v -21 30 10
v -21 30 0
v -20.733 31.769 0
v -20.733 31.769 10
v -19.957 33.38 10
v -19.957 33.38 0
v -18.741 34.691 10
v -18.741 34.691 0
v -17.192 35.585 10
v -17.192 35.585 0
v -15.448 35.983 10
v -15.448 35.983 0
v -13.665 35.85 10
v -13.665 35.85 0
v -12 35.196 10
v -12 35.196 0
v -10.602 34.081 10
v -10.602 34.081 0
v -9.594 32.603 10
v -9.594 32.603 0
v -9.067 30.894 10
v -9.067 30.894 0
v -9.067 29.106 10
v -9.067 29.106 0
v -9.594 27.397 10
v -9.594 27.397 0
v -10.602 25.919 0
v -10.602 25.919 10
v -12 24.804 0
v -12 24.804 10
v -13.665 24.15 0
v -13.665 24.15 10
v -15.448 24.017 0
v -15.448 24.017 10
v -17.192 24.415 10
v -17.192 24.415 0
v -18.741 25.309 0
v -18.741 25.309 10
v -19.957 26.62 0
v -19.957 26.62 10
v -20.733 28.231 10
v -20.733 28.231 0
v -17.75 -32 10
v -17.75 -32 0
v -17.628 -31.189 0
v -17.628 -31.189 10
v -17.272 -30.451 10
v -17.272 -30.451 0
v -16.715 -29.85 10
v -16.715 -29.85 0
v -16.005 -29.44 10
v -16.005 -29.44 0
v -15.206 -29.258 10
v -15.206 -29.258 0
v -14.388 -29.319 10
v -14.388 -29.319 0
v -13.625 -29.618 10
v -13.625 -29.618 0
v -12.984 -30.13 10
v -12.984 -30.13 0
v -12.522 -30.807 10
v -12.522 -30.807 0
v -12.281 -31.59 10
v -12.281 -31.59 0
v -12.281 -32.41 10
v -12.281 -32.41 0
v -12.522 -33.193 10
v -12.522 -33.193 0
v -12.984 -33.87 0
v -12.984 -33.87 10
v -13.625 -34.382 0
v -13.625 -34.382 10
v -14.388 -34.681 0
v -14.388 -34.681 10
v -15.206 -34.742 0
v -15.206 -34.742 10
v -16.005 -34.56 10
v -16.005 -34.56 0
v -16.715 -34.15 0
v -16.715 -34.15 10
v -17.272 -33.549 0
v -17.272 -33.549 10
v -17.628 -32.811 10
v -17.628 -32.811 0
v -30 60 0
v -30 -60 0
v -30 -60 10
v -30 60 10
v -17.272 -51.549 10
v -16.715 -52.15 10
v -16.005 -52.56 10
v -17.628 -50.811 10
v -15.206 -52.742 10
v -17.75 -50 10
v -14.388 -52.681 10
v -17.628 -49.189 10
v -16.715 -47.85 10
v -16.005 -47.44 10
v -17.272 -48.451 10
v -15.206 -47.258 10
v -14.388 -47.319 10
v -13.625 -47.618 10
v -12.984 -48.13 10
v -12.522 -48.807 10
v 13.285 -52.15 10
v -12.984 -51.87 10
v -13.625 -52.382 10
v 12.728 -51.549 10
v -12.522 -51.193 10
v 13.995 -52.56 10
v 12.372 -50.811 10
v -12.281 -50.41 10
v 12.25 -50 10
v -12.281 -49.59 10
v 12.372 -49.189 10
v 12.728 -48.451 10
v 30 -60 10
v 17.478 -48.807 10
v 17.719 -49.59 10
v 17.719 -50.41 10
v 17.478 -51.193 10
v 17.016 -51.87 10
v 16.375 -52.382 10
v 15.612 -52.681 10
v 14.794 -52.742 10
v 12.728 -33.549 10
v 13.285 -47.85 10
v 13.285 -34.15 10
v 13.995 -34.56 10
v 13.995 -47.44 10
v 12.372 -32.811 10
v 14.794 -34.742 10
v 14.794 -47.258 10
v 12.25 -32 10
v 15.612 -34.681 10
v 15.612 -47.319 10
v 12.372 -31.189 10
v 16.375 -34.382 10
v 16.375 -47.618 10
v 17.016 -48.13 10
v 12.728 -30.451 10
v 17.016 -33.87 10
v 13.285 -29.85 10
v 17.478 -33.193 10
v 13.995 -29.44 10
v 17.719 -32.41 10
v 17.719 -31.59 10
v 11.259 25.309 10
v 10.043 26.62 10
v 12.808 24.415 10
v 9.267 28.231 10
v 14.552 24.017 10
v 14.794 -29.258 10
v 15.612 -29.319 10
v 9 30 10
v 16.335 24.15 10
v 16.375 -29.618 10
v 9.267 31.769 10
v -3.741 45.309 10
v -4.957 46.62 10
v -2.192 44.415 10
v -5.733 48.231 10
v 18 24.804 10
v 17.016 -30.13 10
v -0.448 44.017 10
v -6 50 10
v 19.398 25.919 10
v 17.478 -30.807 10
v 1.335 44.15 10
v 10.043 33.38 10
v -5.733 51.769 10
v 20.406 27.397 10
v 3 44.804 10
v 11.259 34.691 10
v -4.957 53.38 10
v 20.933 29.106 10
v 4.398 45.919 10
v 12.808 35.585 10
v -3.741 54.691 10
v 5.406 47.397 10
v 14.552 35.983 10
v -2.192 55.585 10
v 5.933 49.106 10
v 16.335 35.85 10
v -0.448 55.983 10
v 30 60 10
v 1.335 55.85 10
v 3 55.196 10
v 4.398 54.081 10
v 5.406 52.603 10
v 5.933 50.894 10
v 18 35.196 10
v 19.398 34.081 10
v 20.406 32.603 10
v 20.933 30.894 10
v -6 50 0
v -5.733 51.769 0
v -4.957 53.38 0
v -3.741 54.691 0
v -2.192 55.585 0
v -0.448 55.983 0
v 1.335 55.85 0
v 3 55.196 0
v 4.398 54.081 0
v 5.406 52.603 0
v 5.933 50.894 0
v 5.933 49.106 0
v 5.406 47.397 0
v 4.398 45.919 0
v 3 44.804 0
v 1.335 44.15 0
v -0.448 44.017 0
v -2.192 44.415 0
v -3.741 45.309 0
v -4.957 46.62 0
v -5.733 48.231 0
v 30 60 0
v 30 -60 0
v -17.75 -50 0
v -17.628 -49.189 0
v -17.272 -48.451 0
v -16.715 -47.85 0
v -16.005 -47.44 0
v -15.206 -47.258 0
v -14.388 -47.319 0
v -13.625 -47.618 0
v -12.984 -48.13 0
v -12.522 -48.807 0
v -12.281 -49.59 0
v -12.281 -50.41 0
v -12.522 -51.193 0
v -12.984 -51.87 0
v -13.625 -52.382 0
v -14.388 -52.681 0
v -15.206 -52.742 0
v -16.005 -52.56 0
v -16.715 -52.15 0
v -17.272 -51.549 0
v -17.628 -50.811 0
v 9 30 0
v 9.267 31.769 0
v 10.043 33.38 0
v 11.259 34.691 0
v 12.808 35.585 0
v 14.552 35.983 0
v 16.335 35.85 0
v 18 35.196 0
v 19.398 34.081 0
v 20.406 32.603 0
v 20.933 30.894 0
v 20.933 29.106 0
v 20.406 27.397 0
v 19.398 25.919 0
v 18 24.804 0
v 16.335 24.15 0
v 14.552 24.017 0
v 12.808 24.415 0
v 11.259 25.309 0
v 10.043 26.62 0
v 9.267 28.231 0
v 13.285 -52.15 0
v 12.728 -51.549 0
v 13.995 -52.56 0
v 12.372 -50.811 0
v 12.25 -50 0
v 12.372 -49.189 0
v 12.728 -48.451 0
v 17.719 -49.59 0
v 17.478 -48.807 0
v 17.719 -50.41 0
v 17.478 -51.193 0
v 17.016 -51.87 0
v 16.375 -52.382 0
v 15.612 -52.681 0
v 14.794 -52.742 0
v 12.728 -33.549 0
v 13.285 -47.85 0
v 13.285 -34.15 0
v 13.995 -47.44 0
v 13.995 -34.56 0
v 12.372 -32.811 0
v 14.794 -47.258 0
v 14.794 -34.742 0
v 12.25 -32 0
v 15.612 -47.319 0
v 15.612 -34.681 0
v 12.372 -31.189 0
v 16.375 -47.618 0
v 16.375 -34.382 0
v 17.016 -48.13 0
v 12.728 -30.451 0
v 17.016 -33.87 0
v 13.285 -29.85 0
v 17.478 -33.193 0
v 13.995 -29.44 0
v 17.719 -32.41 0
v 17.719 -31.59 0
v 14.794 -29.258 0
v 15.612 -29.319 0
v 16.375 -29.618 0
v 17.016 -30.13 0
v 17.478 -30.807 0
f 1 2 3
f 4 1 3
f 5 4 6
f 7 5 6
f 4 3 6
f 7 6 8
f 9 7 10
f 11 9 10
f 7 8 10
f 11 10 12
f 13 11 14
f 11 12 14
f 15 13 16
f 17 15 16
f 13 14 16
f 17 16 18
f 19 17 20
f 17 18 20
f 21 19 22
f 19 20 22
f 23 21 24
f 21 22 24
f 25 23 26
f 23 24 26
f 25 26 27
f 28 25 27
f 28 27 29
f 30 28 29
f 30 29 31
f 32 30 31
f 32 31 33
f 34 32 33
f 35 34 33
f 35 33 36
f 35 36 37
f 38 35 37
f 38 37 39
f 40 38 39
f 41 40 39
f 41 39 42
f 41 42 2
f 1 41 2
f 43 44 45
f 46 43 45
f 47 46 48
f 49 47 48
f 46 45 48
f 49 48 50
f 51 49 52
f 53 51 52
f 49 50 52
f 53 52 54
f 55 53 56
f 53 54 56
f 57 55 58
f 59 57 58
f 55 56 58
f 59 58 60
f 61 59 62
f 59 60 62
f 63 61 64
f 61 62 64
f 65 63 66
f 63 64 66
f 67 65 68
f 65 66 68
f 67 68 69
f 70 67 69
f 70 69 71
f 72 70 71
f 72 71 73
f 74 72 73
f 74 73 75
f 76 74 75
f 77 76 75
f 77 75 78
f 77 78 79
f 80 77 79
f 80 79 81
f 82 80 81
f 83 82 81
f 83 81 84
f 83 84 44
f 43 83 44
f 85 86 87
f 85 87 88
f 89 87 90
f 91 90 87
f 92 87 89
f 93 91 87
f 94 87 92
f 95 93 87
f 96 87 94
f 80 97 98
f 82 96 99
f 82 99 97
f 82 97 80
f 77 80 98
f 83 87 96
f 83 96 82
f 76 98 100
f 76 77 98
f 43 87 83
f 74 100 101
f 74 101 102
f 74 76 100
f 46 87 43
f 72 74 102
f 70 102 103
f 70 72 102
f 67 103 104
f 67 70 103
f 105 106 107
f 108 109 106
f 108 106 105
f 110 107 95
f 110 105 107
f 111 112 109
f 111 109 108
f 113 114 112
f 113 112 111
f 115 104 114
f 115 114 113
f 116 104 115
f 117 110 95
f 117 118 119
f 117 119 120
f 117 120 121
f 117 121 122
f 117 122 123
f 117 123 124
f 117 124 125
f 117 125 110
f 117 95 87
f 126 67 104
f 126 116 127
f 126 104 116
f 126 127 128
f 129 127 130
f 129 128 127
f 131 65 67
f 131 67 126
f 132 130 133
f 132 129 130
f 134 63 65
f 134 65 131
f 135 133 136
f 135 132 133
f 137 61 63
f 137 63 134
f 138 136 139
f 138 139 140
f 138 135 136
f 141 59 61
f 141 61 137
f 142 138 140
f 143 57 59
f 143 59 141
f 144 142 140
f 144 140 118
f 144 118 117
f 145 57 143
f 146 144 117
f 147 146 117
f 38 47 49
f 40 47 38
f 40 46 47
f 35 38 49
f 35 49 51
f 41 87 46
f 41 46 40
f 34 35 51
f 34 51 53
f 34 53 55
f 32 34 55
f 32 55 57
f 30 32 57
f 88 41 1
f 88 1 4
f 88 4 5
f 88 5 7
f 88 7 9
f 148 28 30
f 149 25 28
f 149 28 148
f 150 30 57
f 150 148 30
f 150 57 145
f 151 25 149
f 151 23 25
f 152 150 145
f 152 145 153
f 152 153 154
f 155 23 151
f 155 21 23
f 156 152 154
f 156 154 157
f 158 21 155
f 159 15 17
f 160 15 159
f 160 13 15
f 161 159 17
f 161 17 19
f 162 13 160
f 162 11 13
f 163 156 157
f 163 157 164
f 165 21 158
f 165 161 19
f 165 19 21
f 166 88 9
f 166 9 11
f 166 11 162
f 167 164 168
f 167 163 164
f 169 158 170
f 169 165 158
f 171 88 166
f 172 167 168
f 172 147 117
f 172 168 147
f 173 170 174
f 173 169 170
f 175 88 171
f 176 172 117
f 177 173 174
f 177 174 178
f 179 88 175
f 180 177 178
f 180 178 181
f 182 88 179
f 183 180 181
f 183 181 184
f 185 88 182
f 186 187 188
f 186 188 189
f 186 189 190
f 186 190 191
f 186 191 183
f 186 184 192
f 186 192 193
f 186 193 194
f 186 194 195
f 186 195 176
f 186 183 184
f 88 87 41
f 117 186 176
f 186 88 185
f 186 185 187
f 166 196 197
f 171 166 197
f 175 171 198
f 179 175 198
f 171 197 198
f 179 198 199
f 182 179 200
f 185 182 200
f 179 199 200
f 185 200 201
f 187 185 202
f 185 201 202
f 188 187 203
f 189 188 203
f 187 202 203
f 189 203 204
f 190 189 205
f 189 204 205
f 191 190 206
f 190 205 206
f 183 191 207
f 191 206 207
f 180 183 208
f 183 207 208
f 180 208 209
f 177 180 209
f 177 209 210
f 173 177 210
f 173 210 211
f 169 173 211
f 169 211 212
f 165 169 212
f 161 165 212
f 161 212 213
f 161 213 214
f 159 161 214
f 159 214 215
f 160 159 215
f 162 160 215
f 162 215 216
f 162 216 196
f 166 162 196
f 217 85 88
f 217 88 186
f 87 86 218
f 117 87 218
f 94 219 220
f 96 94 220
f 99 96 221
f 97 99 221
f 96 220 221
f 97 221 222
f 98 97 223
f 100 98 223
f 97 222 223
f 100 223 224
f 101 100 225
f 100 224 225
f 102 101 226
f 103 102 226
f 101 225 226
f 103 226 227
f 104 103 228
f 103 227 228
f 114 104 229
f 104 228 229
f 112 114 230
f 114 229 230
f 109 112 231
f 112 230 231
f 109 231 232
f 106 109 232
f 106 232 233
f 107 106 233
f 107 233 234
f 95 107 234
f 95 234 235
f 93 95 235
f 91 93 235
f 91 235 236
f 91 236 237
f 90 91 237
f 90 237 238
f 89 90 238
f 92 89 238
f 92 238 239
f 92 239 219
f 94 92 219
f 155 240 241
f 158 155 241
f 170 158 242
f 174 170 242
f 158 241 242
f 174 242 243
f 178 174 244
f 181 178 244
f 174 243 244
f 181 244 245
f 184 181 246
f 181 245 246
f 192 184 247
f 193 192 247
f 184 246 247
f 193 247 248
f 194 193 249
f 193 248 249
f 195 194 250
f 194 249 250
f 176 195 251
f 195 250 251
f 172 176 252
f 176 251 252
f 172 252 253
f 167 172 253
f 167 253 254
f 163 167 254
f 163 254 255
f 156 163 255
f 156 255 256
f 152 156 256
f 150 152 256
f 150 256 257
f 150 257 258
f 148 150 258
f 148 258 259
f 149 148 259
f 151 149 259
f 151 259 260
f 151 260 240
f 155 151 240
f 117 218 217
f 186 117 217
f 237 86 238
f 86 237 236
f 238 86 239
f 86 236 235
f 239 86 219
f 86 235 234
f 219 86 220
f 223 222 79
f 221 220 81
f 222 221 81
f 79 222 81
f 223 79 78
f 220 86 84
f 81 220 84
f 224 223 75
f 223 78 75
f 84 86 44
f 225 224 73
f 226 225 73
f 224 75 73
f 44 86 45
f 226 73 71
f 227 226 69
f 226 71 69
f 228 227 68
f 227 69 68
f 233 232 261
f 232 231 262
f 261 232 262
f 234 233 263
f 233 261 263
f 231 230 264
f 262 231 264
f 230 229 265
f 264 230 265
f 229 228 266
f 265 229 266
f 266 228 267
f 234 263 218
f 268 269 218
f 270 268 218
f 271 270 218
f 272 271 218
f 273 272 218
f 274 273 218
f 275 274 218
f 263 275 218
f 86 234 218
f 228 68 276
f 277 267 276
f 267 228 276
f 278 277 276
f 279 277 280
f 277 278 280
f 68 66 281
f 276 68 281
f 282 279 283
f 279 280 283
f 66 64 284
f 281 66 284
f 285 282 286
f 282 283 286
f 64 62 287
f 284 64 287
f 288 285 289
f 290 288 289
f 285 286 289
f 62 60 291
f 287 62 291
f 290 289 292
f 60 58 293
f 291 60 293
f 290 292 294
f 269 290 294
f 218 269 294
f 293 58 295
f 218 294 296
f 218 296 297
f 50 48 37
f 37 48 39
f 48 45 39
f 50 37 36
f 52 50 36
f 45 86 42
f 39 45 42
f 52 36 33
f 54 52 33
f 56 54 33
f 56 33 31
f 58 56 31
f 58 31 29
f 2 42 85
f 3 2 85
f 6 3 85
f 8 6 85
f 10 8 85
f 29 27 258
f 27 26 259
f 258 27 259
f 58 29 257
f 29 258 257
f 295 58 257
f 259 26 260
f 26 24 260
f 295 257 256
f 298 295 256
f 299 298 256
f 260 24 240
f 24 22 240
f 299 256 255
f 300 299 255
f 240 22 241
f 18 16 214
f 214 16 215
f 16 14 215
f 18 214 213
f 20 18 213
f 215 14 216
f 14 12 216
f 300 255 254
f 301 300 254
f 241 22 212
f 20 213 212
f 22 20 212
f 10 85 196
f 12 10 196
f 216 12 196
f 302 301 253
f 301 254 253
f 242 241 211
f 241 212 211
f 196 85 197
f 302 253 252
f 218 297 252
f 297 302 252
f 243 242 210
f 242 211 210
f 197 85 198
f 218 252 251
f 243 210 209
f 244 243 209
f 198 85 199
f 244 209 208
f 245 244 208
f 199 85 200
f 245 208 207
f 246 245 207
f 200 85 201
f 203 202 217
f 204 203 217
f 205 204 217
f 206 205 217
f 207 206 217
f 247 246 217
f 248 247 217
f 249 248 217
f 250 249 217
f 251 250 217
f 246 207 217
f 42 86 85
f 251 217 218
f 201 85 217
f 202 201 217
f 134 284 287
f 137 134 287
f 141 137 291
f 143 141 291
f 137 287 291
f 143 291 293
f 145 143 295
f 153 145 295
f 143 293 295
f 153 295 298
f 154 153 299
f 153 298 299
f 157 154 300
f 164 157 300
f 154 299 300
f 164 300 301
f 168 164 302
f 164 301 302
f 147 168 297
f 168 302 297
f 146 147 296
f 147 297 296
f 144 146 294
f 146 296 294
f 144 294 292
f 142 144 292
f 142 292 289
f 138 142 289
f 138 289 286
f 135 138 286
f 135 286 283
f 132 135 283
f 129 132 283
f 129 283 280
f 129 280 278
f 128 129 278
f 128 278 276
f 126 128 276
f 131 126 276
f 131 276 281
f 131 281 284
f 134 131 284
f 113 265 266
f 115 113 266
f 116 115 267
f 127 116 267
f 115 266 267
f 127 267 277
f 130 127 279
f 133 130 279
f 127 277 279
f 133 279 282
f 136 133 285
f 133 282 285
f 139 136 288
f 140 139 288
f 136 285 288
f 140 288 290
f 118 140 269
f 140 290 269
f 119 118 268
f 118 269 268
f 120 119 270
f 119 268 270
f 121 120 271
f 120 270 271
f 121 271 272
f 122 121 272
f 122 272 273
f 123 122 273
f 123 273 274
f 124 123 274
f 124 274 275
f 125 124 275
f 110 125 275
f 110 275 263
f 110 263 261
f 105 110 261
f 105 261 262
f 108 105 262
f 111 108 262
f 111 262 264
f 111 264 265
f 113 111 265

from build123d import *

# Parameters (mm, degrees)
SKETCH_1_W      = 60
SKETCH_1_H      = 120
EXTRUDE_1_DEPTH = 10
MM_1_D          = 5.5
MM_1_DEPTH      = 15
MM_1_TIP        = 1.652366702
MM_1_2_D        = 12
MM_1_2_DEPTH    = 15
MM_1_2_TIP      = 3.605163714


with BuildPart() as part:
    # 草图1 → 凸台-拉伸1 (new body)
    with BuildSketch(Plane.XY):
        Rectangle(SKETCH_1_W, SKETCH_1_H)
    extrude(amount=EXTRUDE_1_DEPTH)

    # mm _1
    with Locations(Plane(origin=(-15, -32, 10), x_dir=(1, 0, 0), z_dir=(0, 0, 1))):
        with Locations((0, 0), (30, 0), (30, -18), (0, -18)):
            Hole(MM_1_D / 2, depth=MM_1_DEPTH)
            with Locations((0, 0, -(MM_1_DEPTH + MM_1_TIP / 2))):  # 118° drill point
                Cone(0, MM_1_D / 2, MM_1_TIP, mode=Mode.SUBTRACT)

    # mm _1 2
    with Locations(Plane.XY.offset(10)):
        with Locations((-15, 30), (15, 30), (0, 50)):
            Hole(MM_1_2_D / 2, depth=MM_1_2_DEPTH)
            with Locations((0, 0, -(MM_1_2_DEPTH + MM_1_2_TIP / 2))):  # 118° drill point
                Cone(0, MM_1_2_D / 2, MM_1_2_TIP, mode=Mode.SUBTRACT)


solid = part.part
